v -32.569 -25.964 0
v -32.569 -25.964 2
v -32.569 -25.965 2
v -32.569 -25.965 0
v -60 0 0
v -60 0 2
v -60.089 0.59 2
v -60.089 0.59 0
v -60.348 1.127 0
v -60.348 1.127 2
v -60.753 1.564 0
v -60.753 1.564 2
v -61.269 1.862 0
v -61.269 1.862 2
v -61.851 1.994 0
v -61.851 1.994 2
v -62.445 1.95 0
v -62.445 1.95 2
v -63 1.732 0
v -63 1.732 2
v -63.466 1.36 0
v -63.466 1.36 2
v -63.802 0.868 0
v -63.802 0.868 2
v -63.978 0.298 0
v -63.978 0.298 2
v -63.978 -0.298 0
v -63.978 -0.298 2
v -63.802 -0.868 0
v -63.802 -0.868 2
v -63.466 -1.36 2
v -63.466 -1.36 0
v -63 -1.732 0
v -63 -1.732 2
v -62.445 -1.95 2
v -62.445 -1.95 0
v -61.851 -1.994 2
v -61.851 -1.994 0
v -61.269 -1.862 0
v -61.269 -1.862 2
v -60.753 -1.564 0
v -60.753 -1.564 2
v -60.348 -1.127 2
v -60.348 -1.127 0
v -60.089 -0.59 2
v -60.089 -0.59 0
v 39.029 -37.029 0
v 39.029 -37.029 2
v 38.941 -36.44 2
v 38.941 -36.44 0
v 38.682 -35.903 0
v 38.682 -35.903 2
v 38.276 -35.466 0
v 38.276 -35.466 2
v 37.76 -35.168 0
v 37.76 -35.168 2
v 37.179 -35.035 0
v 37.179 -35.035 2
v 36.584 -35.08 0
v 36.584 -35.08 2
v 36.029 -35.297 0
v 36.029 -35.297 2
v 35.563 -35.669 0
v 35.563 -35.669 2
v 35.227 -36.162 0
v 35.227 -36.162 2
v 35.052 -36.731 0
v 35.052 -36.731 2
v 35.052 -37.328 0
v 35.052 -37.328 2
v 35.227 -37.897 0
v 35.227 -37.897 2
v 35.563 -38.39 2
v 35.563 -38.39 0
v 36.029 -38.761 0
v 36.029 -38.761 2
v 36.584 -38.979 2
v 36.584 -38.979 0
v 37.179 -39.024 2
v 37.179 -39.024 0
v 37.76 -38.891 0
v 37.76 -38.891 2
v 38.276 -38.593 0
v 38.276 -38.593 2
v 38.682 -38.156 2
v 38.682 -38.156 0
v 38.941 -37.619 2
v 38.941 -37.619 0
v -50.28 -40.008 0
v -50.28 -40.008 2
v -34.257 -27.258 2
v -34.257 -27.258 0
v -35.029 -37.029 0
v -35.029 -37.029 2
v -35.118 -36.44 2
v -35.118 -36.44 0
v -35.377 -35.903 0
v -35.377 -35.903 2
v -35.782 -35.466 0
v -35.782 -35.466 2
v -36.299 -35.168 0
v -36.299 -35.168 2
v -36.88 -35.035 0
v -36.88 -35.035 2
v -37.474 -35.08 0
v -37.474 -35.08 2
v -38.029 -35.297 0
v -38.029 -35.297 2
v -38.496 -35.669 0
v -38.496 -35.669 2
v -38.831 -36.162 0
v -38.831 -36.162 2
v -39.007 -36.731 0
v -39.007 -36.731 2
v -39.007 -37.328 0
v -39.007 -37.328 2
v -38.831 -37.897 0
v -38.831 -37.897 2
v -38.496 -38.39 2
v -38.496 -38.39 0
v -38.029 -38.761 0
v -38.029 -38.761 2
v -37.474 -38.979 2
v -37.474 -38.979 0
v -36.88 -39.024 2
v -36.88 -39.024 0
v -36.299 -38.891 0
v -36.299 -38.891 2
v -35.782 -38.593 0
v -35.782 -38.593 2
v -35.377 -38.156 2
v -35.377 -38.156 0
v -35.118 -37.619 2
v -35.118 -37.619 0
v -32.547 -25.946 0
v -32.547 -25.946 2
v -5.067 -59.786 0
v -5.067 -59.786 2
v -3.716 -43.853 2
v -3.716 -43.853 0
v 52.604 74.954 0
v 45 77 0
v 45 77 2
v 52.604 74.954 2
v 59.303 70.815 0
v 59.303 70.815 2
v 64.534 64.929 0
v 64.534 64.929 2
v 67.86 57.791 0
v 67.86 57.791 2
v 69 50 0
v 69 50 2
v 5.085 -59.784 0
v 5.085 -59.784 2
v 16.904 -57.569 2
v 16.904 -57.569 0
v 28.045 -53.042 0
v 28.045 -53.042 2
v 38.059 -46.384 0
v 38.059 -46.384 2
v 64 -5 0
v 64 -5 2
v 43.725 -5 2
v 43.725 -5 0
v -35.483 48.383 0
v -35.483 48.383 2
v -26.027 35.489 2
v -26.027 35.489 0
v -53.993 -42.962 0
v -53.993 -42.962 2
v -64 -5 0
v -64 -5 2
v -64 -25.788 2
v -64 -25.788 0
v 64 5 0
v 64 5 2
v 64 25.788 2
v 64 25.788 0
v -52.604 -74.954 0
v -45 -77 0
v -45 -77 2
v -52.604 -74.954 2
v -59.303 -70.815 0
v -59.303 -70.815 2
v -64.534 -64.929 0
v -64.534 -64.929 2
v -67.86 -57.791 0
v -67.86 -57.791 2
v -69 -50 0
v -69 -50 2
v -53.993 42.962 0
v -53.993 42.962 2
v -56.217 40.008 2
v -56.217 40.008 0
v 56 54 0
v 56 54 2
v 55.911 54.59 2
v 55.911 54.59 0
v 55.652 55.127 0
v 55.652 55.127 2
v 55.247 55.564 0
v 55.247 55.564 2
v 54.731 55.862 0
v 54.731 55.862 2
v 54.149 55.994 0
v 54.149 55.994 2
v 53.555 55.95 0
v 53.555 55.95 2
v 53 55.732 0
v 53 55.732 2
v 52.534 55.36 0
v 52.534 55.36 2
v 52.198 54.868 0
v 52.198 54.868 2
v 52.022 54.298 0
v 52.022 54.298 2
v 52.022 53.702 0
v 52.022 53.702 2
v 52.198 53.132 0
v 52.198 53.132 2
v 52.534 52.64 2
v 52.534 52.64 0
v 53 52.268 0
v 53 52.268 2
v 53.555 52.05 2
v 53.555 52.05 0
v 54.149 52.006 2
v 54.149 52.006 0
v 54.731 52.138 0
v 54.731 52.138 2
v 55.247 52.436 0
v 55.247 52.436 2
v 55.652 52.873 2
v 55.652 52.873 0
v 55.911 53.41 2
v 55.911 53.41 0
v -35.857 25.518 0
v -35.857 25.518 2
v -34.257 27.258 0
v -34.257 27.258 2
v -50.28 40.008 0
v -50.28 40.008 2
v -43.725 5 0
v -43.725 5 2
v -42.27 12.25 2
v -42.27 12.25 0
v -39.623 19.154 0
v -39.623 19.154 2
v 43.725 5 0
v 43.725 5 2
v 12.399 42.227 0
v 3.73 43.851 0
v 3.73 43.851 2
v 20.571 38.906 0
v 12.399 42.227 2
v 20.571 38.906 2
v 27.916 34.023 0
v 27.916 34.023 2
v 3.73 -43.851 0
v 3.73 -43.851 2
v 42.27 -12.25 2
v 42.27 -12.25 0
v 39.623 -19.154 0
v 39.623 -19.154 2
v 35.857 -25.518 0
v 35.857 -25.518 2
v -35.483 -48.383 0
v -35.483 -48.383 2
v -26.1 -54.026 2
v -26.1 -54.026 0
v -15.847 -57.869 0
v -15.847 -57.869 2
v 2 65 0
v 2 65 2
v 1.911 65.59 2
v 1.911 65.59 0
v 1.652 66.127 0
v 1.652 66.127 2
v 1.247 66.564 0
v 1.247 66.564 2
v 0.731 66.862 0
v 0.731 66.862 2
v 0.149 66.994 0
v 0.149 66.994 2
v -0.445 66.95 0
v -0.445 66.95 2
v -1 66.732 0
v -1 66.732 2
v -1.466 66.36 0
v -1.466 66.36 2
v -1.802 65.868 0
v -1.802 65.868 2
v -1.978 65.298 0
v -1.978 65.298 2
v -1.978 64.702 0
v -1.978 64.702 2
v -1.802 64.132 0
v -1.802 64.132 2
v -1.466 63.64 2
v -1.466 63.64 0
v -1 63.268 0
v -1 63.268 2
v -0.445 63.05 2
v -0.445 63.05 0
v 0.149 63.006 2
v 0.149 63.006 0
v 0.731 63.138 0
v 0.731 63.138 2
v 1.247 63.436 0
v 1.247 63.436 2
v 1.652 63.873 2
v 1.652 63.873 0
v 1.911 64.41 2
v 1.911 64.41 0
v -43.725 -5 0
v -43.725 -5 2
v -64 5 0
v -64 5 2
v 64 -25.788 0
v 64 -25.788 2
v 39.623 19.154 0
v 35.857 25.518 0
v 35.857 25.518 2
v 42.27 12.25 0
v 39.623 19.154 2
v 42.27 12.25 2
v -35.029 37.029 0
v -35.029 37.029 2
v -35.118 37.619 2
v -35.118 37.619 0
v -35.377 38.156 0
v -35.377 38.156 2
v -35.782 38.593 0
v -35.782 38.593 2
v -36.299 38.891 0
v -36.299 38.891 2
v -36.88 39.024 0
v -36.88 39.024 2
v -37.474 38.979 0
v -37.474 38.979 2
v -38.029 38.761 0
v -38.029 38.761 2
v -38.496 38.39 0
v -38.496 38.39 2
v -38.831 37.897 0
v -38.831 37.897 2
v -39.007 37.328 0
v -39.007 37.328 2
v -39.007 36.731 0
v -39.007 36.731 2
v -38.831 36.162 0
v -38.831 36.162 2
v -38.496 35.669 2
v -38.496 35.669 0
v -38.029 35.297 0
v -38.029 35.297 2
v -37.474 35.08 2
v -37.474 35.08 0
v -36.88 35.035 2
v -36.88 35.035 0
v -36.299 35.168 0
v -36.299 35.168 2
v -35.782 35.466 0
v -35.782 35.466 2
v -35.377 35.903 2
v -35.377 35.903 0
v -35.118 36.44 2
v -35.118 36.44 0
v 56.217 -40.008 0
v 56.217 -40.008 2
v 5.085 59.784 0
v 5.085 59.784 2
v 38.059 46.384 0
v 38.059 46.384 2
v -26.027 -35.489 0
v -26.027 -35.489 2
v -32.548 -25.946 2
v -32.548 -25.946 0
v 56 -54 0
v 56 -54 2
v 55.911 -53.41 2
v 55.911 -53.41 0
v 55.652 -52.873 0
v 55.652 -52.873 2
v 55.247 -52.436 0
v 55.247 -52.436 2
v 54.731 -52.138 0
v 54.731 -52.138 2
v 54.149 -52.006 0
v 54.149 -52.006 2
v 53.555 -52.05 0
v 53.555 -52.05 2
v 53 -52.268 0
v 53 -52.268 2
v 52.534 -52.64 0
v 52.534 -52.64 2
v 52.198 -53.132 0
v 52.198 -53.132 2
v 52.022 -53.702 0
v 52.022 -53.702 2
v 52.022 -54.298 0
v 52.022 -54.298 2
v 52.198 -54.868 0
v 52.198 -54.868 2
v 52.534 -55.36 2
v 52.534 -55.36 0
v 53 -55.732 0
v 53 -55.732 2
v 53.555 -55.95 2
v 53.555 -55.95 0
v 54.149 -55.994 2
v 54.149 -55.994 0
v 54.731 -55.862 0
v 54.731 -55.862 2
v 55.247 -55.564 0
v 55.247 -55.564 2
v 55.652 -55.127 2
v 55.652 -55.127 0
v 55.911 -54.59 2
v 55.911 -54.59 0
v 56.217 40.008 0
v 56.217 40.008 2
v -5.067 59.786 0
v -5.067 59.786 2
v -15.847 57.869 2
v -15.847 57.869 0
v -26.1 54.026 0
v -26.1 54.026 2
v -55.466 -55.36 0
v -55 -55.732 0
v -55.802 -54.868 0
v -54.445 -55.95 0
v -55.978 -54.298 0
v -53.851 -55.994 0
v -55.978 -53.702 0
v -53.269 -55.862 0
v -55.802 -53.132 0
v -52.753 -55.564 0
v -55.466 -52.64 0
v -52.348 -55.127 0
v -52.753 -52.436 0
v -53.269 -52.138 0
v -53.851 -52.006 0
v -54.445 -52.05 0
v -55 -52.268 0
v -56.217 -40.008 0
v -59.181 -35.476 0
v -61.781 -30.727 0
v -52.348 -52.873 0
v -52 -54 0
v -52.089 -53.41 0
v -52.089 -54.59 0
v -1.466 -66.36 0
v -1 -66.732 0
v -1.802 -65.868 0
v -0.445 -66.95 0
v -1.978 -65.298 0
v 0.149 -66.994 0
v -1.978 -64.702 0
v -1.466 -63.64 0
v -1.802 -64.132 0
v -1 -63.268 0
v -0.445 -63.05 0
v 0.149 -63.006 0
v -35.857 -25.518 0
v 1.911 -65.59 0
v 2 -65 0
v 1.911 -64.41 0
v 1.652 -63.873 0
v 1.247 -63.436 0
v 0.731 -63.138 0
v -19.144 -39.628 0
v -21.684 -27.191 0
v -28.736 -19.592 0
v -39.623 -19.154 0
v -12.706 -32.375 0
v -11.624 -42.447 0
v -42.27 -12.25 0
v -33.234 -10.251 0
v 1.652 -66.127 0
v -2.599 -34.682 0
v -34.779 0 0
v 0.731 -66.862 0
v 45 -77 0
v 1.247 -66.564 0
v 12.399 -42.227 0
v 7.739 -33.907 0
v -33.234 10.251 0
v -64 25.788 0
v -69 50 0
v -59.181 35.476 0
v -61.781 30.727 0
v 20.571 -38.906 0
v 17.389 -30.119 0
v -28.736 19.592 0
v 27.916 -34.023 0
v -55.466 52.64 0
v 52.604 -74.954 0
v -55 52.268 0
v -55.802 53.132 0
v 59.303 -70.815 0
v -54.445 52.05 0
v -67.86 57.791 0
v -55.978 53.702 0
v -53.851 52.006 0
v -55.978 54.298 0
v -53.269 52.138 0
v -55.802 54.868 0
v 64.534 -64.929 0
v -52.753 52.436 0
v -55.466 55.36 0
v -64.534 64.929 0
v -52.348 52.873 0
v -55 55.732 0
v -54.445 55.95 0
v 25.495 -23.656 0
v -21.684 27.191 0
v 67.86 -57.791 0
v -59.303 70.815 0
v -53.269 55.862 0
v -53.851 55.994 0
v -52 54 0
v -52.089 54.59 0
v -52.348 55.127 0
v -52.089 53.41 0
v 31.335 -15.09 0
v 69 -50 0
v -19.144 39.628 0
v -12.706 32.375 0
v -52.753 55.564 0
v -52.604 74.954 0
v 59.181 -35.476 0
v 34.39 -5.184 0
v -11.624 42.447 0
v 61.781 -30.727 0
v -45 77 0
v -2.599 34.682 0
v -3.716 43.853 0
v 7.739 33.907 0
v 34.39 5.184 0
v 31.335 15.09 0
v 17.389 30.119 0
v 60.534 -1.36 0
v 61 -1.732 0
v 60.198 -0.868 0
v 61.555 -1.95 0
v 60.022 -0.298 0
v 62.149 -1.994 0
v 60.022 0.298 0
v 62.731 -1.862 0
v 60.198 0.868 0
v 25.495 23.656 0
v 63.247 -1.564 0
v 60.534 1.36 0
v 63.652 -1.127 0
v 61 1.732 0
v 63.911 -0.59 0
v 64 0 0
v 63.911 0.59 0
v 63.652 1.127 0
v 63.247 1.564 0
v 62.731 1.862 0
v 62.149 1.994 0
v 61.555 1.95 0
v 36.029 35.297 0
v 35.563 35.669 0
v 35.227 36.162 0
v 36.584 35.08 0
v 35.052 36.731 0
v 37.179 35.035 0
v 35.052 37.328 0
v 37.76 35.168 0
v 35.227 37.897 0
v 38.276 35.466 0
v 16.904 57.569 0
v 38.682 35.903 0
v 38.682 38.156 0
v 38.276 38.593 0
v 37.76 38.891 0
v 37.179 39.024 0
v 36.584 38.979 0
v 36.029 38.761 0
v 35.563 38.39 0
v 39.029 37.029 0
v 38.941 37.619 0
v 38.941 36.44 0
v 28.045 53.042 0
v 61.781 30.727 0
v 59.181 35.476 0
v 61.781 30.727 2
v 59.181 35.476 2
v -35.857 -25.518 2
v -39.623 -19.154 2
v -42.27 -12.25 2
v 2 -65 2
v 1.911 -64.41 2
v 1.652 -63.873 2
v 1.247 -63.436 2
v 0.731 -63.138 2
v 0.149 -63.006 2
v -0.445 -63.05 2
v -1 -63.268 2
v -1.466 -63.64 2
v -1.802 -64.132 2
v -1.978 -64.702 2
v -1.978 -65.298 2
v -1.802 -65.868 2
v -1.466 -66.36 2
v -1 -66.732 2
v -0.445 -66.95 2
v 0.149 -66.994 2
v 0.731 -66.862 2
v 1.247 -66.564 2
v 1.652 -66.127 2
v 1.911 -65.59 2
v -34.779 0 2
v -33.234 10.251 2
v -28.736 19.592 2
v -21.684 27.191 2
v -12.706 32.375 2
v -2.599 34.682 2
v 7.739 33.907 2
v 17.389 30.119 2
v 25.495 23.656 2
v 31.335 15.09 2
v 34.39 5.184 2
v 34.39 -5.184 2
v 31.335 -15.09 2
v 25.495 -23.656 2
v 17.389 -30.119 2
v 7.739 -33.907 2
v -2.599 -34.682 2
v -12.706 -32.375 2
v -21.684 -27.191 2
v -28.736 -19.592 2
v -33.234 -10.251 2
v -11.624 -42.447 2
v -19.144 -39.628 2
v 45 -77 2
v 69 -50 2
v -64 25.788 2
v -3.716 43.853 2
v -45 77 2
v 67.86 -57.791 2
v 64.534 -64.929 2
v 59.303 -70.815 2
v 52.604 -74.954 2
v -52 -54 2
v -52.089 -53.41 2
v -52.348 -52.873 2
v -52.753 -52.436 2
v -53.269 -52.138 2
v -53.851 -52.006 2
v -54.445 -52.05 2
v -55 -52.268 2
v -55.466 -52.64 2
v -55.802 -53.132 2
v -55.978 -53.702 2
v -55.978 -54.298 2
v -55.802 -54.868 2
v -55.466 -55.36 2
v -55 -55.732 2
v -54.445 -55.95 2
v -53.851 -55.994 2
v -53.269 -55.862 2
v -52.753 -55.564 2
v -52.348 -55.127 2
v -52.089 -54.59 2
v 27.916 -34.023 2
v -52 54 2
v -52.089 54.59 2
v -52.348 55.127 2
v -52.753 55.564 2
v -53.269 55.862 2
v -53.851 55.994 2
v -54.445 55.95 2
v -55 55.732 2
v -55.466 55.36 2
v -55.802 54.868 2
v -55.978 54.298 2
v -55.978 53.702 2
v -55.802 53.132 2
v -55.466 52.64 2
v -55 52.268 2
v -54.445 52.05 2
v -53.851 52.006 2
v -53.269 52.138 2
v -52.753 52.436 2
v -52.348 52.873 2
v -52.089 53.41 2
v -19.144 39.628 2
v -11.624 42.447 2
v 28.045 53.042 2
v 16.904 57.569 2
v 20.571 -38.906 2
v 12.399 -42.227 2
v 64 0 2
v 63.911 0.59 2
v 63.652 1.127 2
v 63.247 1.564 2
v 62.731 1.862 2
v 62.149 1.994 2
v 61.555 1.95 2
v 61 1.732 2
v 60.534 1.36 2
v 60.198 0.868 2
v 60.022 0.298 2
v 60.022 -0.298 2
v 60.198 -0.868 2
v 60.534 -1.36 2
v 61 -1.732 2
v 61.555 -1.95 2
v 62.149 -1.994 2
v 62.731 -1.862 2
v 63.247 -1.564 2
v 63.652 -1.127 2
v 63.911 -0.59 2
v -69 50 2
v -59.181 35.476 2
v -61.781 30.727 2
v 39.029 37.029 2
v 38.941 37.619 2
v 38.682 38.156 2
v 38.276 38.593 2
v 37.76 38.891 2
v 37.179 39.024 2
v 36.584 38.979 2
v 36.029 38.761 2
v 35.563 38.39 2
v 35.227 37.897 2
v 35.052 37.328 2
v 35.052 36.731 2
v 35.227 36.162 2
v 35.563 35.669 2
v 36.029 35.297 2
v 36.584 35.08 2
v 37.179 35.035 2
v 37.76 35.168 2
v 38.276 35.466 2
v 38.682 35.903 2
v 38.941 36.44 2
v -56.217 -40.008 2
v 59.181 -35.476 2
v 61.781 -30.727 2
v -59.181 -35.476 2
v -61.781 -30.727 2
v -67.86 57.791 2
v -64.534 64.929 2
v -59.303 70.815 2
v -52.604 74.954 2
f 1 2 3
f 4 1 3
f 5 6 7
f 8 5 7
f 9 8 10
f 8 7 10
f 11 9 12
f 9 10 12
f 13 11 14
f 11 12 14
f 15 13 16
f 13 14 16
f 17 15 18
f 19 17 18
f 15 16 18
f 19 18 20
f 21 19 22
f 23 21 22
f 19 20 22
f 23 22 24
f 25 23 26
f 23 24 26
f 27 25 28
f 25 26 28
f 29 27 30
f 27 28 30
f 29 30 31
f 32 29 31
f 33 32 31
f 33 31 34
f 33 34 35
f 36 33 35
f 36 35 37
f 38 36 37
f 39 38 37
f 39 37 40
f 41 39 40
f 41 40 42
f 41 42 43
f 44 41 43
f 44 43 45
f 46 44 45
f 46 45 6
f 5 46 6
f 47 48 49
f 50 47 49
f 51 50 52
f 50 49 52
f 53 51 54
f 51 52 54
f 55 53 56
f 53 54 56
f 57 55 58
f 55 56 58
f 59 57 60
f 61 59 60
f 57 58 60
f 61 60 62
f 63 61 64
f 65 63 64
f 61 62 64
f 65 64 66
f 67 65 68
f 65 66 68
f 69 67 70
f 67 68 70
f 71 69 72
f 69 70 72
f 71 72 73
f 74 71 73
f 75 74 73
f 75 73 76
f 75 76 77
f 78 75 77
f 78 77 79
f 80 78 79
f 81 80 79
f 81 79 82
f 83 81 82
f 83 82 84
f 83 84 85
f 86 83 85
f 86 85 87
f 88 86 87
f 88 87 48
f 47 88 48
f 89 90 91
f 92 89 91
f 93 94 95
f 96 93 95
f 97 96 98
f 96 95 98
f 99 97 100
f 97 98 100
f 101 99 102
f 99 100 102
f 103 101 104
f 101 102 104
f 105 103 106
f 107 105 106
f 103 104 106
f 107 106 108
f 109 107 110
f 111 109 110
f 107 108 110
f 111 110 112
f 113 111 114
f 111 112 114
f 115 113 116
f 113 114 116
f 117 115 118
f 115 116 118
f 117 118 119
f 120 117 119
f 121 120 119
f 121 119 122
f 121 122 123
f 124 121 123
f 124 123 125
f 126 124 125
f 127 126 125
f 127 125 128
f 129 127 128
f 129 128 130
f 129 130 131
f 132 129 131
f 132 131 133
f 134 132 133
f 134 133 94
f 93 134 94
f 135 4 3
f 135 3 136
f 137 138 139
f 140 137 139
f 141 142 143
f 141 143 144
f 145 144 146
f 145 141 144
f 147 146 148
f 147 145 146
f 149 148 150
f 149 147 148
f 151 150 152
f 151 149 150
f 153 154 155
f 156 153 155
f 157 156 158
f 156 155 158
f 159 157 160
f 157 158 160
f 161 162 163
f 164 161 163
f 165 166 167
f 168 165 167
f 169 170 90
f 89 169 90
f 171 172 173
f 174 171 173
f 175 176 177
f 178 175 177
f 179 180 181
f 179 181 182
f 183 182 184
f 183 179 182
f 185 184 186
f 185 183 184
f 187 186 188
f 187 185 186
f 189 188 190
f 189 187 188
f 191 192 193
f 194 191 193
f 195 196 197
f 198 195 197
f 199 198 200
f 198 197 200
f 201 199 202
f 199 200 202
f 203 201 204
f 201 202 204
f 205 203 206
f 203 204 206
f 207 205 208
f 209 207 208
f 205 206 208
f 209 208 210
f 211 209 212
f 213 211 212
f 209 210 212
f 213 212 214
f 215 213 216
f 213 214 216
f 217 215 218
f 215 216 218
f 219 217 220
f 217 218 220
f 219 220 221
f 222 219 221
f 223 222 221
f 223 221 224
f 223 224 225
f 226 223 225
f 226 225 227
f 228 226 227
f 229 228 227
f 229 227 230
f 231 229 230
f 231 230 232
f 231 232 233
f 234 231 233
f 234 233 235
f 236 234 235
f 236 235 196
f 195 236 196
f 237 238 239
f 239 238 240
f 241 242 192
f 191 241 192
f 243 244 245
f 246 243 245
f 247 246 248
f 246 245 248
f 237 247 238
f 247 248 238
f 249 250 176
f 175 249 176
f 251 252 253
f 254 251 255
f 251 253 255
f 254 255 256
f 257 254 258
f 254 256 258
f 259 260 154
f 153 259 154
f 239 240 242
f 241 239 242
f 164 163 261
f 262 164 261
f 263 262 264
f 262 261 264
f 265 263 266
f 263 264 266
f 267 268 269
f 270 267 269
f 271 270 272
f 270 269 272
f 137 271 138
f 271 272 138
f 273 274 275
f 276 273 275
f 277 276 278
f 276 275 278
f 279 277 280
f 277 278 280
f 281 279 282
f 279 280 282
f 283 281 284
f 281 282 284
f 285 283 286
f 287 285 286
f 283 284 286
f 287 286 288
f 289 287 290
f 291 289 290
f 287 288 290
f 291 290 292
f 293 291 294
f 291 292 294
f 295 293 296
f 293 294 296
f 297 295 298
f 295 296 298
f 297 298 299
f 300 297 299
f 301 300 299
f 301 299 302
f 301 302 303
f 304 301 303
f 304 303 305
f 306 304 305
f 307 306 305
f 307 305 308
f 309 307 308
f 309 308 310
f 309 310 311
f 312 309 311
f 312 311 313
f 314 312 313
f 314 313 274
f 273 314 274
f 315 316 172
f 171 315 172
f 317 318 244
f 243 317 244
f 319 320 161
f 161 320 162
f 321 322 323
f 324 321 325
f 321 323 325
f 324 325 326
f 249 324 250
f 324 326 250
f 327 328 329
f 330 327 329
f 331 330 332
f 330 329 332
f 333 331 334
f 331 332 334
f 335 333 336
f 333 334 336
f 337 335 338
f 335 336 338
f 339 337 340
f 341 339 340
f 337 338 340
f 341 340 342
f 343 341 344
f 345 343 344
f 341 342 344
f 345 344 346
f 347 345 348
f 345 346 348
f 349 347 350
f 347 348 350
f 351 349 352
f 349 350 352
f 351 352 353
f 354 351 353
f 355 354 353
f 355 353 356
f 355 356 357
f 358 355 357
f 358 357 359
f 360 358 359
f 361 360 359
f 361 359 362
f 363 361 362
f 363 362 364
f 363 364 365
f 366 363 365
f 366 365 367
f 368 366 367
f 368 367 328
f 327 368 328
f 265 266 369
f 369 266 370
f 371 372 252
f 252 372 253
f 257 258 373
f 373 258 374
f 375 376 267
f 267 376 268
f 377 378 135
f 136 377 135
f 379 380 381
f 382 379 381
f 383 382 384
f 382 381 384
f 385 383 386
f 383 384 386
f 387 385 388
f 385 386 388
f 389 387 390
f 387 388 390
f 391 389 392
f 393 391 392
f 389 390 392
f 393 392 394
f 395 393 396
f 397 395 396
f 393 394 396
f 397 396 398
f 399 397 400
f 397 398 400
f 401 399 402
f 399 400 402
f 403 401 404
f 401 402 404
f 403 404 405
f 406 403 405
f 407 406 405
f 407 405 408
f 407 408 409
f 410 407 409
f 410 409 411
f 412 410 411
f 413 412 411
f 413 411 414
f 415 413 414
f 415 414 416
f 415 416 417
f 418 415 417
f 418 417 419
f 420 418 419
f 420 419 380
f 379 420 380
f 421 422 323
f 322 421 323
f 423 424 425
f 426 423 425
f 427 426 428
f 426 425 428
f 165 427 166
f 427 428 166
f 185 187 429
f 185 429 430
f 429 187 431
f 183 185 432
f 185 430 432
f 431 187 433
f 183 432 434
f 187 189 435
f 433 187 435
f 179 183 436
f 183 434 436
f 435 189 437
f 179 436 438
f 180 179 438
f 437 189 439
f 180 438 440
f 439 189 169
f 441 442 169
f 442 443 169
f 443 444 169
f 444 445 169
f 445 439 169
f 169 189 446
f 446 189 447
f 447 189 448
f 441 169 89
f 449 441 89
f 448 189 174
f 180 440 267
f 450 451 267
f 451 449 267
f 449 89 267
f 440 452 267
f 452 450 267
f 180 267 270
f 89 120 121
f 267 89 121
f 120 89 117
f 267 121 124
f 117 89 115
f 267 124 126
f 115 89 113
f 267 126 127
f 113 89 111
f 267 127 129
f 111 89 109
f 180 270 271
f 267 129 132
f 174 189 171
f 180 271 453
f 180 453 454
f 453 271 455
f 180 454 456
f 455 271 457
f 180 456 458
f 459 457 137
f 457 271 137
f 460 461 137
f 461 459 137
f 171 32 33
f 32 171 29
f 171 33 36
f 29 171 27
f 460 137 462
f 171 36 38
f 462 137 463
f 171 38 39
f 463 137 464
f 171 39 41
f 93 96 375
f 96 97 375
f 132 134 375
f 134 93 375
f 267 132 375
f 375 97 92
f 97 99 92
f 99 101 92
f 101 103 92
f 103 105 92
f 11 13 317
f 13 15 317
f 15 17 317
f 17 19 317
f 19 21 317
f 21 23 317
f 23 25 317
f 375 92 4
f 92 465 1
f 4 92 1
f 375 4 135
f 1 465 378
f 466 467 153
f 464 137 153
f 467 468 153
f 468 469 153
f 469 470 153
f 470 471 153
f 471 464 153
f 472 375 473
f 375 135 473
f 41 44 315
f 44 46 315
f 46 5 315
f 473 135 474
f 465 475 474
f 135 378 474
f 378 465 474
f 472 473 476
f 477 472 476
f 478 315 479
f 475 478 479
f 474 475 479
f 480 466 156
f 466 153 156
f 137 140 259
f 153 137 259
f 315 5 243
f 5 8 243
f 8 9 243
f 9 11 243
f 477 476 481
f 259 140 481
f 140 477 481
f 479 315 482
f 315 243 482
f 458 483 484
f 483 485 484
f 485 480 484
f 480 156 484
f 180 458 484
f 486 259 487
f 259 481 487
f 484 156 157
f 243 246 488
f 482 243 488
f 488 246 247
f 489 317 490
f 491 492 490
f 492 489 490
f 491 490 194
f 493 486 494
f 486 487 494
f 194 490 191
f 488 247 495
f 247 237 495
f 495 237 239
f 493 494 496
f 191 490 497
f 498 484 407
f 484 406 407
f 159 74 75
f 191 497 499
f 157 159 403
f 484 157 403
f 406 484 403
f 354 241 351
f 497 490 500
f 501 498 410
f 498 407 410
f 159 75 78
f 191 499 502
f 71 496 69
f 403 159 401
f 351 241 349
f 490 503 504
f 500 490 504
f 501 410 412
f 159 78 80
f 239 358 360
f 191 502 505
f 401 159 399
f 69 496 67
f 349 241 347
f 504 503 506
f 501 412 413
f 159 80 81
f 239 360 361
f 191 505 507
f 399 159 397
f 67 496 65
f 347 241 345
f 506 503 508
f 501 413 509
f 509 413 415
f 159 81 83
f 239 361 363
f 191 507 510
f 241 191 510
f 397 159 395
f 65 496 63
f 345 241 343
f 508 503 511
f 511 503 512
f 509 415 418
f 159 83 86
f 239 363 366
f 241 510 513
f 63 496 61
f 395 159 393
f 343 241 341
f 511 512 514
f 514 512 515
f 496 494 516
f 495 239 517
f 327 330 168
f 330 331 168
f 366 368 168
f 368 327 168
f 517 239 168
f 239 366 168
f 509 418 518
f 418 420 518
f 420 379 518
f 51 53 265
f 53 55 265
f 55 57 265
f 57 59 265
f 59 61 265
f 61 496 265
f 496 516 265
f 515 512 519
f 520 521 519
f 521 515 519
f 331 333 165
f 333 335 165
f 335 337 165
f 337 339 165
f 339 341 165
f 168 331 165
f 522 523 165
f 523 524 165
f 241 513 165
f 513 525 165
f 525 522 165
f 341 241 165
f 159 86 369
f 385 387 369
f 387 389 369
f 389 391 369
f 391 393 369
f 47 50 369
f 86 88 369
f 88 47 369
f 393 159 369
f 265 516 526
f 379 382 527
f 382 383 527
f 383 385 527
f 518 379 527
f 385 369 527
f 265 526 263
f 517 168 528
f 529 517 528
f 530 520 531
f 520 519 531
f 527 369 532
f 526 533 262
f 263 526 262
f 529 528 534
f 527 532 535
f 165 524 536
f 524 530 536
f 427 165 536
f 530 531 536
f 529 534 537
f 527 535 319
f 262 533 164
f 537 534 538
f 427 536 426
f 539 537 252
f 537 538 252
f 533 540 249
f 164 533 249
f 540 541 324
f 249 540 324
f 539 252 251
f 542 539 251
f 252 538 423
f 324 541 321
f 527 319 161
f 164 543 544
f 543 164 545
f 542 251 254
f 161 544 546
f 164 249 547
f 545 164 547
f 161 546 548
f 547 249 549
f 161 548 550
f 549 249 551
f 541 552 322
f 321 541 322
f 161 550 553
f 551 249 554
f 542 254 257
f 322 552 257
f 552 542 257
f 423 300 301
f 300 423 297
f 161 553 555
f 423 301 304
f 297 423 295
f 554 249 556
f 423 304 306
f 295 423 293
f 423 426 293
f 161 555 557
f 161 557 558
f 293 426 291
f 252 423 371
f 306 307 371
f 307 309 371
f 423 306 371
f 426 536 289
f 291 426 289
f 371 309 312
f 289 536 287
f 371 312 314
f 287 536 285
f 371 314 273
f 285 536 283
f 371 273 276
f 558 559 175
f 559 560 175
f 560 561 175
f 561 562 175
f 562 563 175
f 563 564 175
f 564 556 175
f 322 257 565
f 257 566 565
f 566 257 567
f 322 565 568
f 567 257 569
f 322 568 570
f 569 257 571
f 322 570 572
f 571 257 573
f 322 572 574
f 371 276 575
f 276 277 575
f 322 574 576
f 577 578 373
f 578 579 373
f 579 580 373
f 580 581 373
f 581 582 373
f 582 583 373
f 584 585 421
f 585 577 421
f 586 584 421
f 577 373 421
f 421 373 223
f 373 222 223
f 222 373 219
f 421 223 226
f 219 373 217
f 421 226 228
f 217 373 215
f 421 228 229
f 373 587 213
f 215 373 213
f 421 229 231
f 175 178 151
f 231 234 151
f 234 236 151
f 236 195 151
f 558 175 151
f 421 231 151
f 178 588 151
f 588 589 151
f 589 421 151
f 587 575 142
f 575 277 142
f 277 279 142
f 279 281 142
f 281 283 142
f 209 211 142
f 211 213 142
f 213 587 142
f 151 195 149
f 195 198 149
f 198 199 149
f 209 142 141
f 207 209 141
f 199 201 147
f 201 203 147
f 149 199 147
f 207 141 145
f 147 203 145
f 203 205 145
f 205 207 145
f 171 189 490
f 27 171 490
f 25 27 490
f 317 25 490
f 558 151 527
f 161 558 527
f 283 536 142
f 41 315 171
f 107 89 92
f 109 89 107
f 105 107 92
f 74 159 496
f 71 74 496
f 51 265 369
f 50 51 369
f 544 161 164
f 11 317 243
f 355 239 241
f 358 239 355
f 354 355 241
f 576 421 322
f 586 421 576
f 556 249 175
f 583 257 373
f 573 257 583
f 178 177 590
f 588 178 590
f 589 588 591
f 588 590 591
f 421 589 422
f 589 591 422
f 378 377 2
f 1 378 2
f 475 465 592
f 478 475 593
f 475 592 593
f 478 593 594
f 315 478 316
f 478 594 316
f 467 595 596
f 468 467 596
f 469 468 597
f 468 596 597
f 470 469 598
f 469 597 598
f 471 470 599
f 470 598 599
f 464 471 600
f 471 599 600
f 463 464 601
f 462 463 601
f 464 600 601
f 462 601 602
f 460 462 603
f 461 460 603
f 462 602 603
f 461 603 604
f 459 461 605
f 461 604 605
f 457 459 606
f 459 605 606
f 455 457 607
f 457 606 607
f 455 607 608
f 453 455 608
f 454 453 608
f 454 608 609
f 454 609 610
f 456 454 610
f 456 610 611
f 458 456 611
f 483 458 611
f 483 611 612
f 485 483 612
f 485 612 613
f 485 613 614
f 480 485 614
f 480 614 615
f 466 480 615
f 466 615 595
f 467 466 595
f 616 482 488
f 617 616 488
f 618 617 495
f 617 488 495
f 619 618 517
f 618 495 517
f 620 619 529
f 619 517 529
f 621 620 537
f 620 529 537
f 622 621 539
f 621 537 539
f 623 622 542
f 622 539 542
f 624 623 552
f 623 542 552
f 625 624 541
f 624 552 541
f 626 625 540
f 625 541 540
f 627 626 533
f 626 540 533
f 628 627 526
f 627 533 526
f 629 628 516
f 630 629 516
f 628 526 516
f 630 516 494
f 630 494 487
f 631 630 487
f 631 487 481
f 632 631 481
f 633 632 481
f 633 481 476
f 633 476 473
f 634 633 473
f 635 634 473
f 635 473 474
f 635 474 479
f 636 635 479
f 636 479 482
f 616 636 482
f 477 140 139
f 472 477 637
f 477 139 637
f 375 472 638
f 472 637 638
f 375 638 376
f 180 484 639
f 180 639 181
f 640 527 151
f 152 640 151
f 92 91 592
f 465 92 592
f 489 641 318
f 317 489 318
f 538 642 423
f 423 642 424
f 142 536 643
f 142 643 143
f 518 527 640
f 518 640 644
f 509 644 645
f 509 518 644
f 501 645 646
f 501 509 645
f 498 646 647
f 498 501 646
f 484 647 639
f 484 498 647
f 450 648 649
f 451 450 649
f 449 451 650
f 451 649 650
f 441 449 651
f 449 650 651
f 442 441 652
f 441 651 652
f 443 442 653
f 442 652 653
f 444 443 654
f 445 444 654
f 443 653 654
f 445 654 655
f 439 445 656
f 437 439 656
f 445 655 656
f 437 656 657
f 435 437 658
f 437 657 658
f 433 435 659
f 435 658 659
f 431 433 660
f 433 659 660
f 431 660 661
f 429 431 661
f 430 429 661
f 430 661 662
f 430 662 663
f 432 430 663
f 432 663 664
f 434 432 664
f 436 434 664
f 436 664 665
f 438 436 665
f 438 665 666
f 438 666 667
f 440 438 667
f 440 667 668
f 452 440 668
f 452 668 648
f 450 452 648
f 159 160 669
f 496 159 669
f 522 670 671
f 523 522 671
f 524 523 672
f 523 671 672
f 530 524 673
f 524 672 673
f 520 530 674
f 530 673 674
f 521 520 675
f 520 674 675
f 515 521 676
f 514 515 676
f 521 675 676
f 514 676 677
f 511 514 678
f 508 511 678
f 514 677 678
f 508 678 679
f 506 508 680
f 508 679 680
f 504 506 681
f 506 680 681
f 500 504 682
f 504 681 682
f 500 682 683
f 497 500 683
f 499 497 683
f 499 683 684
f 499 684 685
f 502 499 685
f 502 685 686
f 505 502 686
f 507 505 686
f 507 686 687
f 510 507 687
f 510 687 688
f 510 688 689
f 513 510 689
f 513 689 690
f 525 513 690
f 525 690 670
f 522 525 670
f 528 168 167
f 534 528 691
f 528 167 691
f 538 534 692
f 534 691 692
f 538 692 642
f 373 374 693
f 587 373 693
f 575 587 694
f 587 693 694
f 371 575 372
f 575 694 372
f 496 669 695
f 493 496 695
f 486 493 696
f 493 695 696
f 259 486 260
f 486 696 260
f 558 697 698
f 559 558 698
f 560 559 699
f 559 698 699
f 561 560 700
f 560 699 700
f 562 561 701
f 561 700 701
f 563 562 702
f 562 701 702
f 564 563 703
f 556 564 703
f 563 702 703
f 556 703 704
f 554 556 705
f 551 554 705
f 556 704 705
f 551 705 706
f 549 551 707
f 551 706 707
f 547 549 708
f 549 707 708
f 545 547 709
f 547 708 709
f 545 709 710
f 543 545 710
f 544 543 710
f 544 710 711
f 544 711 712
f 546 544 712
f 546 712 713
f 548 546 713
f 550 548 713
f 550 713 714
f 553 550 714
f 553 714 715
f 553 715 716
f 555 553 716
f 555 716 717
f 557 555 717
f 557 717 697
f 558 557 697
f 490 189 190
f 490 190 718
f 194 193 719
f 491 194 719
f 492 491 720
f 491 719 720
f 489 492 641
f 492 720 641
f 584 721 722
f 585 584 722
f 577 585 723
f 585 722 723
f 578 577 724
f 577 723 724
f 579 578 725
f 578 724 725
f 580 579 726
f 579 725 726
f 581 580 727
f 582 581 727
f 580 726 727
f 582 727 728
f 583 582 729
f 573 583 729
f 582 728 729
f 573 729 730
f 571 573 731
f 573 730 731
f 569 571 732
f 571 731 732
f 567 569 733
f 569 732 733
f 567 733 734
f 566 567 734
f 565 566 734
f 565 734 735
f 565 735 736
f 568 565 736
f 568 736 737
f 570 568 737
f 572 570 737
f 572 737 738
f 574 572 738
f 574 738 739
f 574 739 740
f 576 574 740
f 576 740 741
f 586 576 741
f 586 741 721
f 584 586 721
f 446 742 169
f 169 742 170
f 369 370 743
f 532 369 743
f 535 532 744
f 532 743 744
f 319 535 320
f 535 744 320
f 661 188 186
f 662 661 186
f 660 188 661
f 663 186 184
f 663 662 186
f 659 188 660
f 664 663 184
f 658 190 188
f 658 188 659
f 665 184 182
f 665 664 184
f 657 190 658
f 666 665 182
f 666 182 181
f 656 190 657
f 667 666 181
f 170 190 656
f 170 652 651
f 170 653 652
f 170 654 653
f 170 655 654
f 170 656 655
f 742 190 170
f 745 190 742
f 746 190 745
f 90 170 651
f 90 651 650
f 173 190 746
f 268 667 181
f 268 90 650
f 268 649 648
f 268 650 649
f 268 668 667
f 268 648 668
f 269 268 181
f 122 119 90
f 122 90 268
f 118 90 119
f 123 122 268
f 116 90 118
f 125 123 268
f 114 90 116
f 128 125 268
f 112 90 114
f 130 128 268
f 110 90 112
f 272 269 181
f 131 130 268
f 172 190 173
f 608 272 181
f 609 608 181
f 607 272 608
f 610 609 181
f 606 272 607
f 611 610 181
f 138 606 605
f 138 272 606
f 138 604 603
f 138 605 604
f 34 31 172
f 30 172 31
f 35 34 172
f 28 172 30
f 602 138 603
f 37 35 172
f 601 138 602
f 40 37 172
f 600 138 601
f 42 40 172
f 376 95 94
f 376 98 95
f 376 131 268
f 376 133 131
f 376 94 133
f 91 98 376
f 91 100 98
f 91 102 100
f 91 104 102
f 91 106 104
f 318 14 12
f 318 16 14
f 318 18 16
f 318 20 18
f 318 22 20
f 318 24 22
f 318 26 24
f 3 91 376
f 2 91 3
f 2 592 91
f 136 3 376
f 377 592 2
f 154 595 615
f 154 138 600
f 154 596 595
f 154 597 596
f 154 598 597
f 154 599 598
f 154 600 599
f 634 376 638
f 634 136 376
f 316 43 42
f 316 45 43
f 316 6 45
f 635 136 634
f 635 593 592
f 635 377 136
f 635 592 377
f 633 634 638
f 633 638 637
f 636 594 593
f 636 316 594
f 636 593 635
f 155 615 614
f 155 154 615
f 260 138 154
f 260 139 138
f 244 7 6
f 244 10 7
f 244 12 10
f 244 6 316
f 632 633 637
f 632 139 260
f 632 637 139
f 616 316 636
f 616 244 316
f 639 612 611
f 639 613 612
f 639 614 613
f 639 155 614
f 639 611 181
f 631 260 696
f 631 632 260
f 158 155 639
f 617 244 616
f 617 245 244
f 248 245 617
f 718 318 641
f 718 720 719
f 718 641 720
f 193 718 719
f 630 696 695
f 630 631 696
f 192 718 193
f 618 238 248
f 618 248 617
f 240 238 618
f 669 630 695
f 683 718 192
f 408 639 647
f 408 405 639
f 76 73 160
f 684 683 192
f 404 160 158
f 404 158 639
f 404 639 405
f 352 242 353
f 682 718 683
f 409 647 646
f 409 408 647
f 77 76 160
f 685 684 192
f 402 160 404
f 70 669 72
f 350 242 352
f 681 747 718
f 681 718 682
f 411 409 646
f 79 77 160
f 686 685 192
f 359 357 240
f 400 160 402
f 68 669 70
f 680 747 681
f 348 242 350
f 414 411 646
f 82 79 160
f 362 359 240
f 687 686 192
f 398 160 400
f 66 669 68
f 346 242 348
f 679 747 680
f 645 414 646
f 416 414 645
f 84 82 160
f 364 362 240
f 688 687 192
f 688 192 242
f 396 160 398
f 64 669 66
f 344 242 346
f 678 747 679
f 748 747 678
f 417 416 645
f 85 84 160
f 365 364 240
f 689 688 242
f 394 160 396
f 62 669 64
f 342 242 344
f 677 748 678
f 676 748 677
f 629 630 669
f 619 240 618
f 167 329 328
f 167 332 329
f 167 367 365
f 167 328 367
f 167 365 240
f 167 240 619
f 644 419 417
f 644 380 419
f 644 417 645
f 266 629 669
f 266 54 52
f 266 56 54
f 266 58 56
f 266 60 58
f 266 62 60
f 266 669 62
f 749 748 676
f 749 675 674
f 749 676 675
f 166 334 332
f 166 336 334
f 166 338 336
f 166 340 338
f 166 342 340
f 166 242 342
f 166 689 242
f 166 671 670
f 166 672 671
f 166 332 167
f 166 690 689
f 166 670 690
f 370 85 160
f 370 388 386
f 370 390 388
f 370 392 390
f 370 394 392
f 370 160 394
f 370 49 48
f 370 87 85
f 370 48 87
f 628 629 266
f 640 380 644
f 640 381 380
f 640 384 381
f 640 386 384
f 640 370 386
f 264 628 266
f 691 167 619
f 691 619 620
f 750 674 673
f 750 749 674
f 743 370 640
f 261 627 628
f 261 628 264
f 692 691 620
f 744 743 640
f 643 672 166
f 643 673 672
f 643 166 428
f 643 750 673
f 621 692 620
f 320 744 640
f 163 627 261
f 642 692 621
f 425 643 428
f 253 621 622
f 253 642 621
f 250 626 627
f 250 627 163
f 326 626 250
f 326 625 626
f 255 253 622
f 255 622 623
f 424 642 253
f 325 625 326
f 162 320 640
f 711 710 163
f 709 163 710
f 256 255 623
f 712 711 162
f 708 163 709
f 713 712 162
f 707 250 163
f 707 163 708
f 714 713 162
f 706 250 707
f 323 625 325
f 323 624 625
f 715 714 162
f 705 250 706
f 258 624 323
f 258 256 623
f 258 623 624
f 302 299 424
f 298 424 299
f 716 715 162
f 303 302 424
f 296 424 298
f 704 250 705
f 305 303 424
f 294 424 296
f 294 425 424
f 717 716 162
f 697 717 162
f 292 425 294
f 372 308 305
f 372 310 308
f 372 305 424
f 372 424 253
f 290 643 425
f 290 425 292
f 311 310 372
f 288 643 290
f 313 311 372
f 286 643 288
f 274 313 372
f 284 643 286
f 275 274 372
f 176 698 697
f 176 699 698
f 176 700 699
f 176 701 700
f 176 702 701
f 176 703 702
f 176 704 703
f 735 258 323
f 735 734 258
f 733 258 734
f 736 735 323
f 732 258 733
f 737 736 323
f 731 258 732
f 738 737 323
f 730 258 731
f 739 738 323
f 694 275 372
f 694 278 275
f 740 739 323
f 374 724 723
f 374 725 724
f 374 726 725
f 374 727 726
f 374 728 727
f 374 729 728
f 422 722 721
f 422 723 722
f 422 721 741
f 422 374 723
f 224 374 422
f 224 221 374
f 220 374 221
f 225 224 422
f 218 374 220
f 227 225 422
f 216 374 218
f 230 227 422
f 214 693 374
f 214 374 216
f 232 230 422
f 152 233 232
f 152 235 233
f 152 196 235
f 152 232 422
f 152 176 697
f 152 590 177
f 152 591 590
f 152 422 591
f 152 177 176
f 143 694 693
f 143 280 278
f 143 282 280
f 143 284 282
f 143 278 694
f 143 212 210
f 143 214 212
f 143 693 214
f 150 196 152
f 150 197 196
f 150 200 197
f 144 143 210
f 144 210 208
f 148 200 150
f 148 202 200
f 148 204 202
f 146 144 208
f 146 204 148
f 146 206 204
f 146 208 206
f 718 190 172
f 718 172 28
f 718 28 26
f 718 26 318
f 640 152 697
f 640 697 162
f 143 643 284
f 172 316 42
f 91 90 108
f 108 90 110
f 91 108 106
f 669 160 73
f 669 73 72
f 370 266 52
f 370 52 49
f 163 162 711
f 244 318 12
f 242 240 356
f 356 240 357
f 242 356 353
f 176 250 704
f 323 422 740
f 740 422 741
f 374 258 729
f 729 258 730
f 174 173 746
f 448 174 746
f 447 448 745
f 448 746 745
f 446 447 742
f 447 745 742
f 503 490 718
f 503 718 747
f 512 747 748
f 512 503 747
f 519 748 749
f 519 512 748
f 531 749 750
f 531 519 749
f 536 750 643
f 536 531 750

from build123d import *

# Parameters (mm, degrees)
SKETCH1_W           = 90
SKETCH1_H           = 100
SKETCH1_H_2         = 22
SKETCH1_W_2         = 24
BOSS_EXTRUDE1_DEPTH = 2
CUT_EXTRUDE1_DEPTH  = 10
CUT_EXTRUDE2_DEPTH  = 10
SKETCH4_R           = 30
CUT_EXTRUDE3_DEPTH  = 10
CUT_EXTRUDE4_DEPTH  = 10
CUT_EXTRUDE5_DEPTH  = 10
BOSS_EXTRUDE3_START = -2
SKETCH8_R           = 30
SKETCH8_R_2         = 28
BOSS_EXTRUDE3_DEPTH = 2
BOSS_EXTRUDE5_DEPTH = 2
BOSS_EXTRUDE6_DEPTH = 2
SKETCH11_R          = 34.778777804
CUT_EXTRUDE6_DEPTH  = 10
SKETCH12_R          = 2
CUT_EXTRUDE7_DEPTH  = 10


with BuildPart() as part:
    # Sketch1 → Boss-Extrude1 (new body)
    with BuildSketch(Plane.XY):
        Rectangle(SKETCH1_W, SKETCH1_H)
        with Locations((0, 61)):
            Rectangle(SKETCH1_W, SKETCH1_H_2)
        with Locations((57, 0)):
            Rectangle(SKETCH1_W_2, SKETCH1_H)
        with BuildLine():
            Line((45, 50), (69, 50))
            ThreePointArc((69, 50), (61.278820596, 65.667804287), (45, 72))
            Line((45, 72), (45, 50))
        make_face()
        with BuildLine():
            ThreePointArc((45, -72), (61.83891888, -66.278820596), (69, -50))
            Line((69, -50), (45, -50))
            Line((45, -50), (45, -72))
        make_face()
        with Locations((0, -61)):
            Rectangle(SKETCH1_W, SKETCH1_H_2)
        with BuildLine():
            Line((-45, -72), (-45, -50))
            Line((-45, -50), (-69, -50))
            ThreePointArc((-69, -50), (-61.278820596, -65.667804287), (-45, -72))
        make_face()
        with Locations((-57, 0)):
            Rectangle(SKETCH1_W_2, SKETCH1_H)
        with BuildLine():
            Line((-69, 50), (-45, 50))
            Line((-45, 50), (-45, 72))
            ThreePointArc((-45, 72), (-61.83891888, 66.278820596), (-69, 50))
        make_face()
    extrude(amount=BOSS_EXTRUDE1_DEPTH)

    # Sketch2 → Cut-Extrude1 (cut)
    with BuildSketch(Plane.XY.offset(2)):
        with BuildLine():
            Line((-60.760739313, 25.787593916), (-64, 15.649215929))
            Line((-64, 15.649215929), (-64, 5))
            Line((-64, 5), (-43.724760028, 5))
            ThreePointArc((-43.724760028, 5), (-41.091915324, 15.757827722), (-35.856683042, 25.517698186))
            Line((-35.856683042, 25.517698186), (-56.217391304, 40.007560722))
            ThreePointArc((-56.217391304, 40.007560722), (-60.52773874, 33.126920216), (-64, 25.787593916))
            Line((-64, 25.787593916), (-60.760739313, 25.787593916))
        make_face()
        with BuildLine():
            Line((-64, -5), (-64, -25.787593916))
            ThreePointArc((-64, -25.787593916), (-60.52773874, -33.126920216), (-56.217391304, -40.007560722))
            Line((-56.217391304, -40.007560722), (-35.856683042, -25.517698186))
            ThreePointArc((-35.856683042, -25.517698186), (-41.091915324, -15.757827722), (-43.724760028, -5))
            Line((-43.724760028, -5), (-64, -5))
        make_face()
        with BuildLine():
            Line((-35.483097289, 48.383362913), (-26.026680798, 35.488963441))
            ThreePointArc((-26.026680798, 35.488963441), (-15.448259809, 41.209293956), (-3.716315379, 43.852521472))
            Line((-3.716315379, 43.852521472), (-5.066584601, 59.785698294))
            ThreePointArc((-5.066584601, 59.785698294), (-21.061160661, 56.182092446), (-35.483097289, 48.383362913))
        make_face()
        with BuildLine():
            ThreePointArc((64, 25.787593916), (60.52773874, 33.126920216), (56.217391304, 40.007560722))
            Line((56.217391304, 40.007560722), (35.856683042, 25.517698186))
            ThreePointArc((35.856683042, 25.517698186), (41.091915324, 15.757827722), (43.724760028, 5))
            Line((43.724760028, 5), (64, 5))
            Line((64, 5), (64, 25.787593916))
        make_face()
        with BuildLine():
            Line((-26.026680798, -35.488963441), (-35.483097289, -48.383362913))
            ThreePointArc((-35.483097289, -48.383362913), (-21.061160661, -56.182092446), (-5.066584601, -59.785698294))
            Line((-5.066584601, -59.785698294), (-3.716315379, -43.852521472))
            ThreePointArc((-3.716315379, -43.852521472), (-15.448259809, -41.209293956), (-26.026680798, -35.488963441))
        make_face()
        with BuildLine():
            ThreePointArc((56.217391304, -40.007560722), (60.52773874, -33.126920216), (64, -25.787593916))
            Line((64, -25.787593916), (64, -5))
            Line((64, -5), (43.724760028, -5))
            ThreePointArc((43.724760028, -5), (41.091915324, -15.757827722), (35.856683042, -25.517698186))
            Line((35.856683042, -25.517698186), (56.217391304, -40.007560722))
        make_face()
        with BuildLine():
            Line((27.916279909, 34.022580083), (38.059254795, 46.384190458))
            ThreePointArc((38.059254795, 46.384190458), (22.588514074, 55.585600941), (5.084745763, 59.784156434))
            Line((5.084745763, 59.784156434), (3.729636503, 43.851390526))
            ThreePointArc((3.729636503, 43.851390526), (16.568566174, 40.771770312), (27.916279909, 34.022580083))
        make_face()
        with BuildLine():
            Line((3.729636503, -43.851390526), (5.084745763, -59.784156434))
            ThreePointArc((5.084745763, -59.784156434), (22.588514074, -55.585600941), (38.059254795, -46.384190458))
            Line((38.059254795, -46.384190458), (27.916279909, -34.022580083))
            ThreePointArc((27.916279909, -34.022580083), (16.568566174, -40.771770312), (3.729636503, -43.851390526))
        make_face()
    extrude(amount=-CUT_EXTRUDE1_DEPTH, mode=Mode.SUBTRACT)

    # Sketch3 → Cut-Extrude2 (cut)
    with BuildSketch(Plane.XY.offset(2)):
        Polygon((-64, 25.787593916), (-64, 15.649215929), (-60.760739313, 25.787593916), align=None)
    extrude(amount=-CUT_EXTRUDE2_DEPTH, mode=Mode.SUBTRACT)

    # Sketch4 → Cut-Extrude3 (cut)
    with BuildSketch(Plane(origin=(0, 0, 0), x_dir=(-1, 0, 0), z_dir=(0, 0, -1))):
        Circle(SKETCH4_R)
    extrude(amount=-CUT_EXTRUDE3_DEPTH, mode=Mode.SUBTRACT)

    # Sketch6 → Cut-Extrude4 (cut)
    with BuildSketch(Plane.XY.offset(2)):
        Polygon((-35.856683042, -25.517698186), (-56.217391304, -40.007560722), (-50.280397209, -40.007560722), (-34.257403731, -27.258240508), align=None)
        Polygon((-50.280397209, 40.007560722), (-56.217391304, 40.007560722), (-35.856683042, 25.517698186), (-34.257403731, 27.258240508), align=None)
        Polygon((-50.280397209, -40.007560722), (-56.217391304, -40.007560722), (-53.993303971, -42.96187992), align=None)
        Polygon((-53.993303971, 42.96187992), (-56.217391304, 40.007560722), (-50.280397209, 40.007560722), align=None)
    extrude(amount=-CUT_EXTRUDE4_DEPTH, mode=Mode.SUBTRACT)

    # Sketch7 → Cut-Extrude5 (cut)
    with BuildSketch(Plane.XY.offset(2)):
        Polygon((-32.560271117, 27.267561972), (-24.823321267, 33.603144582), (-18.487738656, 25.866194731), (-26.224688507, 19.530612121), align=None)
        Polygon((27.827762823, 32.155388995), (19.915267174, 26.040455421), (26.030200748, 18.127959772), (33.942696396, 24.242893346), align=None)
        Polygon((33.988304577, -25.549058378), (27.336365779, -18.082351592), (19.869658993, -24.734290389), (26.521597791, -32.200997176), align=None)
        Polygon((-26.126682472, -33.612215797), (-18.478667441, -27.169555937), (-24.921327301, -19.521540905), (-32.569342333, -25.964200766), align=None)
    extrude(amount=-CUT_EXTRUDE5_DEPTH, mode=Mode.SUBTRACT)

    # Sketch8 → Boss-Extrude3 (add)
    with BuildSketch(Plane.XY.offset(2).offset(BOSS_EXTRUDE3_START)):
        Circle(SKETCH8_R)
        Circle(SKETCH8_R_2, mode=Mode.SUBTRACT)
    extrude(amount=BOSS_EXTRUDE3_DEPTH)

    # Sketch9 → Boss-Extrude5 (add)
    with BuildSketch(Plane(origin=(0, 0, 0), x_dir=(-1, 0, 0), z_dir=(0, 0, -1))):
        Polygon((32.694861491, 27.157349491), (26.359278881, 19.420399641), (18.487738656, 25.866194731), (24.823321267, 33.603144582), align=None)
        Polygon((32.547632539, -25.945912516), (26.104972678, -33.593927547), (18.478667441, -27.169555937), (24.921327301, -19.521540905), align=None)
        Polygon((-27.336365779, -18.082351592), (-34.046734551, -25.614645193), (-26.580027765, -32.266583991), (-19.869658993, -24.734290389), align=None)
        Polygon((-27.829205352, 32.153522415), (-19.916709703, 26.038588842), (-26.030200748, 18.127959772), (-33.942696396, 24.242893346), align=None)
        with BuildLine():
            Line((-45, 72), (0, 72))
            Line((0, 72), (0, 77))
            Line((0, 77), (-45, 77))
            ThreePointArc((-45, 77), (-62.132690852, 68.062391868), (-69, 50))
            ThreePointArc((-69, 50), (-61.278820596, 65.667804287), (-45, 72))
        make_face()
        with BuildLine():
            Line((0, 77), (0, 72))
            Line((0, 72), (45, 72))
            ThreePointArc((45, 72), (61.278820596, 65.667804287), (69, 50))
            ThreePointArc((69, 50), (62.132690852, 68.062391868), (45, 77))
            Line((45, 77), (0, 77))
        make_face()
        with BuildLine():
            ThreePointArc((45, -77), (62.132690852, -68.062391868), (69, -50))
            ThreePointArc((69, -50), (61.278820596, -65.667804287), (45, -72))
            Line((45, -72), (0, -72))
            Line((0, -72), (0, -77))
            Line((0, -77), (45, -77))
        make_face()
        with BuildLine():
            ThreePointArc((-45, -72), (-61.278820596, -65.667804287), (-69, -50))
            ThreePointArc((-69, -50), (-62.132690852, -68.062391868), (-45, -77))
            Line((-45, -77), (0, -77))
            Line((0, -77), (0, -72))
            Line((0, -72), (-45, -72))
        make_face()
    extrude(amount=-BOSS_EXTRUDE5_DEPTH)

    # Sketch10 → Boss-Extrude6 (add)
    with BuildSketch(Plane(origin=(0, 0, 0), x_dir=(-1, 0, 0), z_dir=(0, 0, -1))):
        Polygon((-27.829205352, 32.153522415), (-27.827762823, 32.155388995), (-19.915267174, 26.040455421), (-19.916709703, 26.038588842), align=None)
        Polygon((26.104972678, -33.593927547), (26.126682472, -33.612215797), (32.568924212, -25.964697113), (32.547214419, -25.946408862), align=None)
    extrude(amount=-BOSS_EXTRUDE6_DEPTH)

    # Sketch11 → Cut-Extrude6 (cut)
    with BuildSketch(Plane(origin=(0, 0, 0), x_dir=(-1, 0, 0), z_dir=(0, 0, -1))):
        Circle(SKETCH11_R)
    extrude(amount=-CUT_EXTRUDE6_DEPTH, mode=Mode.SUBTRACT)

    # Sketch12 → Cut-Extrude7 (cut)
    with BuildSketch(Plane.XY.offset(2)):
        with Locations((0, -65)):
            Circle(SKETCH12_R)
        with Locations((62, 0)):
            Circle(SKETCH12_R)
        with Locations((-62, 0)):
            Circle(SKETCH12_R)
        with Locations((0, 65)):
            Circle(SKETCH12_R)
        with Locations((-37.029437252, 37.029437252)):
            Circle(SKETCH12_R)
        with Locations((-54, 54)):
            Circle(SKETCH12_R)
        with Locations((54, 54)):
            Circle(SKETCH12_R)
        with Locations((37.029437252, 37.029437252)):
            Circle(SKETCH12_R)
        with Locations((-54, -54)):
            Circle(SKETCH12_R)
        with Locations((-37.029437252, -37.029437252)):
            Circle(SKETCH12_R)
        with Locations((37.029437252, -37.029437252)):
            Circle(SKETCH12_R)
        with Locations((54, -54)):
            Circle(SKETCH12_R)
    extrude(amount=-CUT_EXTRUDE7_DEPTH, mode=Mode.SUBTRACT)


solid = part.part
